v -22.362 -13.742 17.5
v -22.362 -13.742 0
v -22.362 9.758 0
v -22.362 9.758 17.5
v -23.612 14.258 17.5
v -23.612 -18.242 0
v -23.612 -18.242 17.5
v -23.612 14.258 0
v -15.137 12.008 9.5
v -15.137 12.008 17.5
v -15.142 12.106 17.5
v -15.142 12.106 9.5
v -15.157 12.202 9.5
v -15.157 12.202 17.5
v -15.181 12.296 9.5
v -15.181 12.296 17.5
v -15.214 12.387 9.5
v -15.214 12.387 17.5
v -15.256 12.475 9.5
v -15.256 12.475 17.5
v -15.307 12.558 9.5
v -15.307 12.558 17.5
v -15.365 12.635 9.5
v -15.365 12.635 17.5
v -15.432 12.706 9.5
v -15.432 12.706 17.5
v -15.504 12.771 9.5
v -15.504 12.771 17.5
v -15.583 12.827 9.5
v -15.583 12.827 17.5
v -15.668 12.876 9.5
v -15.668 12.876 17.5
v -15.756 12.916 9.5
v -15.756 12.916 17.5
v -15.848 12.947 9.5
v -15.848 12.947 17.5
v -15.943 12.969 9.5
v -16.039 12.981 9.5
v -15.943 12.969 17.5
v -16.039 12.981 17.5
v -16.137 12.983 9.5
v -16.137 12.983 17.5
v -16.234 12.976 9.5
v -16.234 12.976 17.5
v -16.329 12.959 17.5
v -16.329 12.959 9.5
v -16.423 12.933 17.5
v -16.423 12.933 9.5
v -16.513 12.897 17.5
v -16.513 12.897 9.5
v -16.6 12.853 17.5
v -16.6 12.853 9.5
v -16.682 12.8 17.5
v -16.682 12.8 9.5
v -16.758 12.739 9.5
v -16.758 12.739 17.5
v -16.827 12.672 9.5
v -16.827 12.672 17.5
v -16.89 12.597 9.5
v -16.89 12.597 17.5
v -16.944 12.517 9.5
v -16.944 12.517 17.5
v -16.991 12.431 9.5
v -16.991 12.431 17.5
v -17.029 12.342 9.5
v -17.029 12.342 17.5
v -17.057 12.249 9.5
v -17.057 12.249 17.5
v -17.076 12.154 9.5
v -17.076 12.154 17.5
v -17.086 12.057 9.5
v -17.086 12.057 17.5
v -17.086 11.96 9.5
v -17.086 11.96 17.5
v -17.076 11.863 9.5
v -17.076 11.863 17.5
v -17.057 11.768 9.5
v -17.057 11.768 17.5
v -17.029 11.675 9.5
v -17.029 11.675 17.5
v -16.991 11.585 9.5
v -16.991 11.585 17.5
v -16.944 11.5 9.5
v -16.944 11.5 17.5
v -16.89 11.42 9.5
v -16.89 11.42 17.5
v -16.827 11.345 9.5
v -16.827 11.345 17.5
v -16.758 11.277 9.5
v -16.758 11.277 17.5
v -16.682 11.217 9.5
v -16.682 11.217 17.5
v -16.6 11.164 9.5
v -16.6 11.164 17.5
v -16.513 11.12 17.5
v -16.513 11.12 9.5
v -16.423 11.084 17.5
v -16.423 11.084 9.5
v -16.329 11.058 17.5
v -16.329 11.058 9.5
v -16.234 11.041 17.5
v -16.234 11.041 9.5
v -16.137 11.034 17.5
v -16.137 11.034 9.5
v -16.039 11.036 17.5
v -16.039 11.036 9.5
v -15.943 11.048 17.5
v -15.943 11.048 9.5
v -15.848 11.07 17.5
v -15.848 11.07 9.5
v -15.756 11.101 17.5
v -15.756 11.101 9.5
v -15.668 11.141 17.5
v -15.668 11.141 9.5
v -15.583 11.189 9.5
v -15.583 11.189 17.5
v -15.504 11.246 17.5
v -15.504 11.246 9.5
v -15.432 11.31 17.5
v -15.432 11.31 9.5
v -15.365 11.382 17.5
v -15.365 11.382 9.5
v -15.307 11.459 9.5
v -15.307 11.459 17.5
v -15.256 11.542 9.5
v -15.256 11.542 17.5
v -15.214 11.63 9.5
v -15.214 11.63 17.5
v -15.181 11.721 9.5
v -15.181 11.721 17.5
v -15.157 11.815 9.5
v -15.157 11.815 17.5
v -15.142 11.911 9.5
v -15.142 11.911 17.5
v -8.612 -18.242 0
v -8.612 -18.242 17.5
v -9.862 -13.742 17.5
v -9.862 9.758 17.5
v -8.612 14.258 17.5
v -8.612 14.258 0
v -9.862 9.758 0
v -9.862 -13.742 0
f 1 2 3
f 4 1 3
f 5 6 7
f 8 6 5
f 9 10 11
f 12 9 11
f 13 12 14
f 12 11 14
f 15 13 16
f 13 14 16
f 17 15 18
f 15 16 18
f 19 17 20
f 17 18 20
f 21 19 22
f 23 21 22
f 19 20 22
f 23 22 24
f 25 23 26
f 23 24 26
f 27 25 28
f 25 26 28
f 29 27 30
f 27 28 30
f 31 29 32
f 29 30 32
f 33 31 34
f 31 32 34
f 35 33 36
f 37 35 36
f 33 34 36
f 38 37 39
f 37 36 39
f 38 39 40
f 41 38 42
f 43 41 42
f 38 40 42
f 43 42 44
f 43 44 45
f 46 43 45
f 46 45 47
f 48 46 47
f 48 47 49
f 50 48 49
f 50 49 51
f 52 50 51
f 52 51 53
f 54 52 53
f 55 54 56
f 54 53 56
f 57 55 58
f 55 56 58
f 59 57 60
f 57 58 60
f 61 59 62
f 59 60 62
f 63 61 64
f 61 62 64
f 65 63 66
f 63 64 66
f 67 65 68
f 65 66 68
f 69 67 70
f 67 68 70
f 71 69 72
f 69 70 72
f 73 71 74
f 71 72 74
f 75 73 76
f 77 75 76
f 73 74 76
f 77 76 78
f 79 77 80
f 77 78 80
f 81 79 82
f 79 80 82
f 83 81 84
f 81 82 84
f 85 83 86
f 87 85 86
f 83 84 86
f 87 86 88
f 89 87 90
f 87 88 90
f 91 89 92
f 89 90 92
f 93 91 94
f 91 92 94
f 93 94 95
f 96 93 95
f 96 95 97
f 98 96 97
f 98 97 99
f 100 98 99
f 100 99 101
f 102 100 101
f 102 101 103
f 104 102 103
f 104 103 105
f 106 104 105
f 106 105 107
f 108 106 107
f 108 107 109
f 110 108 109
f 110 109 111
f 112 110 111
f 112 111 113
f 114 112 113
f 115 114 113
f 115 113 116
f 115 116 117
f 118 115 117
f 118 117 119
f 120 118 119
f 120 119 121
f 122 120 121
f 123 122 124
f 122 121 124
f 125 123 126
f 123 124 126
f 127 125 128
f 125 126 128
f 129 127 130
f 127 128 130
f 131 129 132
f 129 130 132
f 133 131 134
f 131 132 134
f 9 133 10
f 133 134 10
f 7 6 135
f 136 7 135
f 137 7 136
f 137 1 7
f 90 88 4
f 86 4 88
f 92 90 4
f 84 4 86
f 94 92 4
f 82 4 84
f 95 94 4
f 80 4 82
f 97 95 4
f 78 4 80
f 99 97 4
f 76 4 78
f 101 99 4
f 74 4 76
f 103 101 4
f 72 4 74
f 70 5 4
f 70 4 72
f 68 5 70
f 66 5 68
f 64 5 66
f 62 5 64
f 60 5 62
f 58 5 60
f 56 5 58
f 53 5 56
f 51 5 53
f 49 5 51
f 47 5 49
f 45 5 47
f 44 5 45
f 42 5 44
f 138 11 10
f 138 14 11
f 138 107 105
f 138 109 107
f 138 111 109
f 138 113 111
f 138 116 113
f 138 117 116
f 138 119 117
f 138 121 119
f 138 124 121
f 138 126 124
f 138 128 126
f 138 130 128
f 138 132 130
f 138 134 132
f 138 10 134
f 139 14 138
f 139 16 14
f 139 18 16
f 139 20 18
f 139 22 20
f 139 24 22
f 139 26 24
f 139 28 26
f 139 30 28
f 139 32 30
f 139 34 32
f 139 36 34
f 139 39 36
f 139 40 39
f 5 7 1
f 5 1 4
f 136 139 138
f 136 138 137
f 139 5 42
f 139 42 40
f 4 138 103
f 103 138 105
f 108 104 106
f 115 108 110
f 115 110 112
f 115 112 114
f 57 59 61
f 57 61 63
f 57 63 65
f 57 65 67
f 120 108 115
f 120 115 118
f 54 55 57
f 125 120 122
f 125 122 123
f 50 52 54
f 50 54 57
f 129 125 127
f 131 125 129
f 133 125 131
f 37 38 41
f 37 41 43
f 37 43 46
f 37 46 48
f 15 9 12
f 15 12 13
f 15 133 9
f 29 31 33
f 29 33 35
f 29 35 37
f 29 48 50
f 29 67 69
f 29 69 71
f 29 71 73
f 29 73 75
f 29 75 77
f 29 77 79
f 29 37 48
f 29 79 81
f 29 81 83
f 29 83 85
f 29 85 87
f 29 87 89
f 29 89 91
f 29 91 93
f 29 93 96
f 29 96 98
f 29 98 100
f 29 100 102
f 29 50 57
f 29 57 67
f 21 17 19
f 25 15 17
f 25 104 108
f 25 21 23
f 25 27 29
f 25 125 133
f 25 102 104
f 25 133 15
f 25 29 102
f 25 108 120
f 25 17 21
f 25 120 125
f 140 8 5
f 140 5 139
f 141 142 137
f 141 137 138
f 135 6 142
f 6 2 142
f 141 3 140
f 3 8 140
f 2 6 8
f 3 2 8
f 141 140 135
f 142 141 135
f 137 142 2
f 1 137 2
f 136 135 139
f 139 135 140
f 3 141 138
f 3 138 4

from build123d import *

# Parameters (mm, degrees)
SKETCH2_W           = 15
SKETCH2_H           = 32.5
BOSS_EXTRUDE1_DEPTH = 17.5
SKETCH3_W           = 12.5
SKETCH3_H           = 23.5
CUT_EXTRUDE1_DEPTH  = 17.5
SKETCH5_R           = 0.975
CUT_EXTRUDE2_DEPTH  = 8


with BuildPart() as part:
    # Sketch2 → Boss-Extrude1 (new body)
    with BuildSketch(Plane.XY):
        with Locations((-16.112359551, -1.991573034)):
            Rectangle(SKETCH2_W, SKETCH2_H)
    extrude(amount=BOSS_EXTRUDE1_DEPTH)

    # Sketch3 → Cut-Extrude1 (cut)
    with BuildSketch(Plane(origin=(0, 0, 0), x_dir=(-1, 0, 0), z_dir=(0, 0, -1))):
        with Locations((16.112359551, -1.991573034)):
            Rectangle(SKETCH3_W, SKETCH3_H)
    extrude(amount=-CUT_EXTRUDE1_DEPTH, mode=Mode.SUBTRACT)

    # Sketch5 → Cut-Extrude2 (cut)
    with BuildSketch(Plane.XY.offset(17.5)):
        with Locations((-16.112359551, 12.008426966)):
            Circle(SKETCH5_R)
    extrude(amount=-CUT_EXTRUDE2_DEPTH, mode=Mode.SUBTRACT)


solid = part.part
